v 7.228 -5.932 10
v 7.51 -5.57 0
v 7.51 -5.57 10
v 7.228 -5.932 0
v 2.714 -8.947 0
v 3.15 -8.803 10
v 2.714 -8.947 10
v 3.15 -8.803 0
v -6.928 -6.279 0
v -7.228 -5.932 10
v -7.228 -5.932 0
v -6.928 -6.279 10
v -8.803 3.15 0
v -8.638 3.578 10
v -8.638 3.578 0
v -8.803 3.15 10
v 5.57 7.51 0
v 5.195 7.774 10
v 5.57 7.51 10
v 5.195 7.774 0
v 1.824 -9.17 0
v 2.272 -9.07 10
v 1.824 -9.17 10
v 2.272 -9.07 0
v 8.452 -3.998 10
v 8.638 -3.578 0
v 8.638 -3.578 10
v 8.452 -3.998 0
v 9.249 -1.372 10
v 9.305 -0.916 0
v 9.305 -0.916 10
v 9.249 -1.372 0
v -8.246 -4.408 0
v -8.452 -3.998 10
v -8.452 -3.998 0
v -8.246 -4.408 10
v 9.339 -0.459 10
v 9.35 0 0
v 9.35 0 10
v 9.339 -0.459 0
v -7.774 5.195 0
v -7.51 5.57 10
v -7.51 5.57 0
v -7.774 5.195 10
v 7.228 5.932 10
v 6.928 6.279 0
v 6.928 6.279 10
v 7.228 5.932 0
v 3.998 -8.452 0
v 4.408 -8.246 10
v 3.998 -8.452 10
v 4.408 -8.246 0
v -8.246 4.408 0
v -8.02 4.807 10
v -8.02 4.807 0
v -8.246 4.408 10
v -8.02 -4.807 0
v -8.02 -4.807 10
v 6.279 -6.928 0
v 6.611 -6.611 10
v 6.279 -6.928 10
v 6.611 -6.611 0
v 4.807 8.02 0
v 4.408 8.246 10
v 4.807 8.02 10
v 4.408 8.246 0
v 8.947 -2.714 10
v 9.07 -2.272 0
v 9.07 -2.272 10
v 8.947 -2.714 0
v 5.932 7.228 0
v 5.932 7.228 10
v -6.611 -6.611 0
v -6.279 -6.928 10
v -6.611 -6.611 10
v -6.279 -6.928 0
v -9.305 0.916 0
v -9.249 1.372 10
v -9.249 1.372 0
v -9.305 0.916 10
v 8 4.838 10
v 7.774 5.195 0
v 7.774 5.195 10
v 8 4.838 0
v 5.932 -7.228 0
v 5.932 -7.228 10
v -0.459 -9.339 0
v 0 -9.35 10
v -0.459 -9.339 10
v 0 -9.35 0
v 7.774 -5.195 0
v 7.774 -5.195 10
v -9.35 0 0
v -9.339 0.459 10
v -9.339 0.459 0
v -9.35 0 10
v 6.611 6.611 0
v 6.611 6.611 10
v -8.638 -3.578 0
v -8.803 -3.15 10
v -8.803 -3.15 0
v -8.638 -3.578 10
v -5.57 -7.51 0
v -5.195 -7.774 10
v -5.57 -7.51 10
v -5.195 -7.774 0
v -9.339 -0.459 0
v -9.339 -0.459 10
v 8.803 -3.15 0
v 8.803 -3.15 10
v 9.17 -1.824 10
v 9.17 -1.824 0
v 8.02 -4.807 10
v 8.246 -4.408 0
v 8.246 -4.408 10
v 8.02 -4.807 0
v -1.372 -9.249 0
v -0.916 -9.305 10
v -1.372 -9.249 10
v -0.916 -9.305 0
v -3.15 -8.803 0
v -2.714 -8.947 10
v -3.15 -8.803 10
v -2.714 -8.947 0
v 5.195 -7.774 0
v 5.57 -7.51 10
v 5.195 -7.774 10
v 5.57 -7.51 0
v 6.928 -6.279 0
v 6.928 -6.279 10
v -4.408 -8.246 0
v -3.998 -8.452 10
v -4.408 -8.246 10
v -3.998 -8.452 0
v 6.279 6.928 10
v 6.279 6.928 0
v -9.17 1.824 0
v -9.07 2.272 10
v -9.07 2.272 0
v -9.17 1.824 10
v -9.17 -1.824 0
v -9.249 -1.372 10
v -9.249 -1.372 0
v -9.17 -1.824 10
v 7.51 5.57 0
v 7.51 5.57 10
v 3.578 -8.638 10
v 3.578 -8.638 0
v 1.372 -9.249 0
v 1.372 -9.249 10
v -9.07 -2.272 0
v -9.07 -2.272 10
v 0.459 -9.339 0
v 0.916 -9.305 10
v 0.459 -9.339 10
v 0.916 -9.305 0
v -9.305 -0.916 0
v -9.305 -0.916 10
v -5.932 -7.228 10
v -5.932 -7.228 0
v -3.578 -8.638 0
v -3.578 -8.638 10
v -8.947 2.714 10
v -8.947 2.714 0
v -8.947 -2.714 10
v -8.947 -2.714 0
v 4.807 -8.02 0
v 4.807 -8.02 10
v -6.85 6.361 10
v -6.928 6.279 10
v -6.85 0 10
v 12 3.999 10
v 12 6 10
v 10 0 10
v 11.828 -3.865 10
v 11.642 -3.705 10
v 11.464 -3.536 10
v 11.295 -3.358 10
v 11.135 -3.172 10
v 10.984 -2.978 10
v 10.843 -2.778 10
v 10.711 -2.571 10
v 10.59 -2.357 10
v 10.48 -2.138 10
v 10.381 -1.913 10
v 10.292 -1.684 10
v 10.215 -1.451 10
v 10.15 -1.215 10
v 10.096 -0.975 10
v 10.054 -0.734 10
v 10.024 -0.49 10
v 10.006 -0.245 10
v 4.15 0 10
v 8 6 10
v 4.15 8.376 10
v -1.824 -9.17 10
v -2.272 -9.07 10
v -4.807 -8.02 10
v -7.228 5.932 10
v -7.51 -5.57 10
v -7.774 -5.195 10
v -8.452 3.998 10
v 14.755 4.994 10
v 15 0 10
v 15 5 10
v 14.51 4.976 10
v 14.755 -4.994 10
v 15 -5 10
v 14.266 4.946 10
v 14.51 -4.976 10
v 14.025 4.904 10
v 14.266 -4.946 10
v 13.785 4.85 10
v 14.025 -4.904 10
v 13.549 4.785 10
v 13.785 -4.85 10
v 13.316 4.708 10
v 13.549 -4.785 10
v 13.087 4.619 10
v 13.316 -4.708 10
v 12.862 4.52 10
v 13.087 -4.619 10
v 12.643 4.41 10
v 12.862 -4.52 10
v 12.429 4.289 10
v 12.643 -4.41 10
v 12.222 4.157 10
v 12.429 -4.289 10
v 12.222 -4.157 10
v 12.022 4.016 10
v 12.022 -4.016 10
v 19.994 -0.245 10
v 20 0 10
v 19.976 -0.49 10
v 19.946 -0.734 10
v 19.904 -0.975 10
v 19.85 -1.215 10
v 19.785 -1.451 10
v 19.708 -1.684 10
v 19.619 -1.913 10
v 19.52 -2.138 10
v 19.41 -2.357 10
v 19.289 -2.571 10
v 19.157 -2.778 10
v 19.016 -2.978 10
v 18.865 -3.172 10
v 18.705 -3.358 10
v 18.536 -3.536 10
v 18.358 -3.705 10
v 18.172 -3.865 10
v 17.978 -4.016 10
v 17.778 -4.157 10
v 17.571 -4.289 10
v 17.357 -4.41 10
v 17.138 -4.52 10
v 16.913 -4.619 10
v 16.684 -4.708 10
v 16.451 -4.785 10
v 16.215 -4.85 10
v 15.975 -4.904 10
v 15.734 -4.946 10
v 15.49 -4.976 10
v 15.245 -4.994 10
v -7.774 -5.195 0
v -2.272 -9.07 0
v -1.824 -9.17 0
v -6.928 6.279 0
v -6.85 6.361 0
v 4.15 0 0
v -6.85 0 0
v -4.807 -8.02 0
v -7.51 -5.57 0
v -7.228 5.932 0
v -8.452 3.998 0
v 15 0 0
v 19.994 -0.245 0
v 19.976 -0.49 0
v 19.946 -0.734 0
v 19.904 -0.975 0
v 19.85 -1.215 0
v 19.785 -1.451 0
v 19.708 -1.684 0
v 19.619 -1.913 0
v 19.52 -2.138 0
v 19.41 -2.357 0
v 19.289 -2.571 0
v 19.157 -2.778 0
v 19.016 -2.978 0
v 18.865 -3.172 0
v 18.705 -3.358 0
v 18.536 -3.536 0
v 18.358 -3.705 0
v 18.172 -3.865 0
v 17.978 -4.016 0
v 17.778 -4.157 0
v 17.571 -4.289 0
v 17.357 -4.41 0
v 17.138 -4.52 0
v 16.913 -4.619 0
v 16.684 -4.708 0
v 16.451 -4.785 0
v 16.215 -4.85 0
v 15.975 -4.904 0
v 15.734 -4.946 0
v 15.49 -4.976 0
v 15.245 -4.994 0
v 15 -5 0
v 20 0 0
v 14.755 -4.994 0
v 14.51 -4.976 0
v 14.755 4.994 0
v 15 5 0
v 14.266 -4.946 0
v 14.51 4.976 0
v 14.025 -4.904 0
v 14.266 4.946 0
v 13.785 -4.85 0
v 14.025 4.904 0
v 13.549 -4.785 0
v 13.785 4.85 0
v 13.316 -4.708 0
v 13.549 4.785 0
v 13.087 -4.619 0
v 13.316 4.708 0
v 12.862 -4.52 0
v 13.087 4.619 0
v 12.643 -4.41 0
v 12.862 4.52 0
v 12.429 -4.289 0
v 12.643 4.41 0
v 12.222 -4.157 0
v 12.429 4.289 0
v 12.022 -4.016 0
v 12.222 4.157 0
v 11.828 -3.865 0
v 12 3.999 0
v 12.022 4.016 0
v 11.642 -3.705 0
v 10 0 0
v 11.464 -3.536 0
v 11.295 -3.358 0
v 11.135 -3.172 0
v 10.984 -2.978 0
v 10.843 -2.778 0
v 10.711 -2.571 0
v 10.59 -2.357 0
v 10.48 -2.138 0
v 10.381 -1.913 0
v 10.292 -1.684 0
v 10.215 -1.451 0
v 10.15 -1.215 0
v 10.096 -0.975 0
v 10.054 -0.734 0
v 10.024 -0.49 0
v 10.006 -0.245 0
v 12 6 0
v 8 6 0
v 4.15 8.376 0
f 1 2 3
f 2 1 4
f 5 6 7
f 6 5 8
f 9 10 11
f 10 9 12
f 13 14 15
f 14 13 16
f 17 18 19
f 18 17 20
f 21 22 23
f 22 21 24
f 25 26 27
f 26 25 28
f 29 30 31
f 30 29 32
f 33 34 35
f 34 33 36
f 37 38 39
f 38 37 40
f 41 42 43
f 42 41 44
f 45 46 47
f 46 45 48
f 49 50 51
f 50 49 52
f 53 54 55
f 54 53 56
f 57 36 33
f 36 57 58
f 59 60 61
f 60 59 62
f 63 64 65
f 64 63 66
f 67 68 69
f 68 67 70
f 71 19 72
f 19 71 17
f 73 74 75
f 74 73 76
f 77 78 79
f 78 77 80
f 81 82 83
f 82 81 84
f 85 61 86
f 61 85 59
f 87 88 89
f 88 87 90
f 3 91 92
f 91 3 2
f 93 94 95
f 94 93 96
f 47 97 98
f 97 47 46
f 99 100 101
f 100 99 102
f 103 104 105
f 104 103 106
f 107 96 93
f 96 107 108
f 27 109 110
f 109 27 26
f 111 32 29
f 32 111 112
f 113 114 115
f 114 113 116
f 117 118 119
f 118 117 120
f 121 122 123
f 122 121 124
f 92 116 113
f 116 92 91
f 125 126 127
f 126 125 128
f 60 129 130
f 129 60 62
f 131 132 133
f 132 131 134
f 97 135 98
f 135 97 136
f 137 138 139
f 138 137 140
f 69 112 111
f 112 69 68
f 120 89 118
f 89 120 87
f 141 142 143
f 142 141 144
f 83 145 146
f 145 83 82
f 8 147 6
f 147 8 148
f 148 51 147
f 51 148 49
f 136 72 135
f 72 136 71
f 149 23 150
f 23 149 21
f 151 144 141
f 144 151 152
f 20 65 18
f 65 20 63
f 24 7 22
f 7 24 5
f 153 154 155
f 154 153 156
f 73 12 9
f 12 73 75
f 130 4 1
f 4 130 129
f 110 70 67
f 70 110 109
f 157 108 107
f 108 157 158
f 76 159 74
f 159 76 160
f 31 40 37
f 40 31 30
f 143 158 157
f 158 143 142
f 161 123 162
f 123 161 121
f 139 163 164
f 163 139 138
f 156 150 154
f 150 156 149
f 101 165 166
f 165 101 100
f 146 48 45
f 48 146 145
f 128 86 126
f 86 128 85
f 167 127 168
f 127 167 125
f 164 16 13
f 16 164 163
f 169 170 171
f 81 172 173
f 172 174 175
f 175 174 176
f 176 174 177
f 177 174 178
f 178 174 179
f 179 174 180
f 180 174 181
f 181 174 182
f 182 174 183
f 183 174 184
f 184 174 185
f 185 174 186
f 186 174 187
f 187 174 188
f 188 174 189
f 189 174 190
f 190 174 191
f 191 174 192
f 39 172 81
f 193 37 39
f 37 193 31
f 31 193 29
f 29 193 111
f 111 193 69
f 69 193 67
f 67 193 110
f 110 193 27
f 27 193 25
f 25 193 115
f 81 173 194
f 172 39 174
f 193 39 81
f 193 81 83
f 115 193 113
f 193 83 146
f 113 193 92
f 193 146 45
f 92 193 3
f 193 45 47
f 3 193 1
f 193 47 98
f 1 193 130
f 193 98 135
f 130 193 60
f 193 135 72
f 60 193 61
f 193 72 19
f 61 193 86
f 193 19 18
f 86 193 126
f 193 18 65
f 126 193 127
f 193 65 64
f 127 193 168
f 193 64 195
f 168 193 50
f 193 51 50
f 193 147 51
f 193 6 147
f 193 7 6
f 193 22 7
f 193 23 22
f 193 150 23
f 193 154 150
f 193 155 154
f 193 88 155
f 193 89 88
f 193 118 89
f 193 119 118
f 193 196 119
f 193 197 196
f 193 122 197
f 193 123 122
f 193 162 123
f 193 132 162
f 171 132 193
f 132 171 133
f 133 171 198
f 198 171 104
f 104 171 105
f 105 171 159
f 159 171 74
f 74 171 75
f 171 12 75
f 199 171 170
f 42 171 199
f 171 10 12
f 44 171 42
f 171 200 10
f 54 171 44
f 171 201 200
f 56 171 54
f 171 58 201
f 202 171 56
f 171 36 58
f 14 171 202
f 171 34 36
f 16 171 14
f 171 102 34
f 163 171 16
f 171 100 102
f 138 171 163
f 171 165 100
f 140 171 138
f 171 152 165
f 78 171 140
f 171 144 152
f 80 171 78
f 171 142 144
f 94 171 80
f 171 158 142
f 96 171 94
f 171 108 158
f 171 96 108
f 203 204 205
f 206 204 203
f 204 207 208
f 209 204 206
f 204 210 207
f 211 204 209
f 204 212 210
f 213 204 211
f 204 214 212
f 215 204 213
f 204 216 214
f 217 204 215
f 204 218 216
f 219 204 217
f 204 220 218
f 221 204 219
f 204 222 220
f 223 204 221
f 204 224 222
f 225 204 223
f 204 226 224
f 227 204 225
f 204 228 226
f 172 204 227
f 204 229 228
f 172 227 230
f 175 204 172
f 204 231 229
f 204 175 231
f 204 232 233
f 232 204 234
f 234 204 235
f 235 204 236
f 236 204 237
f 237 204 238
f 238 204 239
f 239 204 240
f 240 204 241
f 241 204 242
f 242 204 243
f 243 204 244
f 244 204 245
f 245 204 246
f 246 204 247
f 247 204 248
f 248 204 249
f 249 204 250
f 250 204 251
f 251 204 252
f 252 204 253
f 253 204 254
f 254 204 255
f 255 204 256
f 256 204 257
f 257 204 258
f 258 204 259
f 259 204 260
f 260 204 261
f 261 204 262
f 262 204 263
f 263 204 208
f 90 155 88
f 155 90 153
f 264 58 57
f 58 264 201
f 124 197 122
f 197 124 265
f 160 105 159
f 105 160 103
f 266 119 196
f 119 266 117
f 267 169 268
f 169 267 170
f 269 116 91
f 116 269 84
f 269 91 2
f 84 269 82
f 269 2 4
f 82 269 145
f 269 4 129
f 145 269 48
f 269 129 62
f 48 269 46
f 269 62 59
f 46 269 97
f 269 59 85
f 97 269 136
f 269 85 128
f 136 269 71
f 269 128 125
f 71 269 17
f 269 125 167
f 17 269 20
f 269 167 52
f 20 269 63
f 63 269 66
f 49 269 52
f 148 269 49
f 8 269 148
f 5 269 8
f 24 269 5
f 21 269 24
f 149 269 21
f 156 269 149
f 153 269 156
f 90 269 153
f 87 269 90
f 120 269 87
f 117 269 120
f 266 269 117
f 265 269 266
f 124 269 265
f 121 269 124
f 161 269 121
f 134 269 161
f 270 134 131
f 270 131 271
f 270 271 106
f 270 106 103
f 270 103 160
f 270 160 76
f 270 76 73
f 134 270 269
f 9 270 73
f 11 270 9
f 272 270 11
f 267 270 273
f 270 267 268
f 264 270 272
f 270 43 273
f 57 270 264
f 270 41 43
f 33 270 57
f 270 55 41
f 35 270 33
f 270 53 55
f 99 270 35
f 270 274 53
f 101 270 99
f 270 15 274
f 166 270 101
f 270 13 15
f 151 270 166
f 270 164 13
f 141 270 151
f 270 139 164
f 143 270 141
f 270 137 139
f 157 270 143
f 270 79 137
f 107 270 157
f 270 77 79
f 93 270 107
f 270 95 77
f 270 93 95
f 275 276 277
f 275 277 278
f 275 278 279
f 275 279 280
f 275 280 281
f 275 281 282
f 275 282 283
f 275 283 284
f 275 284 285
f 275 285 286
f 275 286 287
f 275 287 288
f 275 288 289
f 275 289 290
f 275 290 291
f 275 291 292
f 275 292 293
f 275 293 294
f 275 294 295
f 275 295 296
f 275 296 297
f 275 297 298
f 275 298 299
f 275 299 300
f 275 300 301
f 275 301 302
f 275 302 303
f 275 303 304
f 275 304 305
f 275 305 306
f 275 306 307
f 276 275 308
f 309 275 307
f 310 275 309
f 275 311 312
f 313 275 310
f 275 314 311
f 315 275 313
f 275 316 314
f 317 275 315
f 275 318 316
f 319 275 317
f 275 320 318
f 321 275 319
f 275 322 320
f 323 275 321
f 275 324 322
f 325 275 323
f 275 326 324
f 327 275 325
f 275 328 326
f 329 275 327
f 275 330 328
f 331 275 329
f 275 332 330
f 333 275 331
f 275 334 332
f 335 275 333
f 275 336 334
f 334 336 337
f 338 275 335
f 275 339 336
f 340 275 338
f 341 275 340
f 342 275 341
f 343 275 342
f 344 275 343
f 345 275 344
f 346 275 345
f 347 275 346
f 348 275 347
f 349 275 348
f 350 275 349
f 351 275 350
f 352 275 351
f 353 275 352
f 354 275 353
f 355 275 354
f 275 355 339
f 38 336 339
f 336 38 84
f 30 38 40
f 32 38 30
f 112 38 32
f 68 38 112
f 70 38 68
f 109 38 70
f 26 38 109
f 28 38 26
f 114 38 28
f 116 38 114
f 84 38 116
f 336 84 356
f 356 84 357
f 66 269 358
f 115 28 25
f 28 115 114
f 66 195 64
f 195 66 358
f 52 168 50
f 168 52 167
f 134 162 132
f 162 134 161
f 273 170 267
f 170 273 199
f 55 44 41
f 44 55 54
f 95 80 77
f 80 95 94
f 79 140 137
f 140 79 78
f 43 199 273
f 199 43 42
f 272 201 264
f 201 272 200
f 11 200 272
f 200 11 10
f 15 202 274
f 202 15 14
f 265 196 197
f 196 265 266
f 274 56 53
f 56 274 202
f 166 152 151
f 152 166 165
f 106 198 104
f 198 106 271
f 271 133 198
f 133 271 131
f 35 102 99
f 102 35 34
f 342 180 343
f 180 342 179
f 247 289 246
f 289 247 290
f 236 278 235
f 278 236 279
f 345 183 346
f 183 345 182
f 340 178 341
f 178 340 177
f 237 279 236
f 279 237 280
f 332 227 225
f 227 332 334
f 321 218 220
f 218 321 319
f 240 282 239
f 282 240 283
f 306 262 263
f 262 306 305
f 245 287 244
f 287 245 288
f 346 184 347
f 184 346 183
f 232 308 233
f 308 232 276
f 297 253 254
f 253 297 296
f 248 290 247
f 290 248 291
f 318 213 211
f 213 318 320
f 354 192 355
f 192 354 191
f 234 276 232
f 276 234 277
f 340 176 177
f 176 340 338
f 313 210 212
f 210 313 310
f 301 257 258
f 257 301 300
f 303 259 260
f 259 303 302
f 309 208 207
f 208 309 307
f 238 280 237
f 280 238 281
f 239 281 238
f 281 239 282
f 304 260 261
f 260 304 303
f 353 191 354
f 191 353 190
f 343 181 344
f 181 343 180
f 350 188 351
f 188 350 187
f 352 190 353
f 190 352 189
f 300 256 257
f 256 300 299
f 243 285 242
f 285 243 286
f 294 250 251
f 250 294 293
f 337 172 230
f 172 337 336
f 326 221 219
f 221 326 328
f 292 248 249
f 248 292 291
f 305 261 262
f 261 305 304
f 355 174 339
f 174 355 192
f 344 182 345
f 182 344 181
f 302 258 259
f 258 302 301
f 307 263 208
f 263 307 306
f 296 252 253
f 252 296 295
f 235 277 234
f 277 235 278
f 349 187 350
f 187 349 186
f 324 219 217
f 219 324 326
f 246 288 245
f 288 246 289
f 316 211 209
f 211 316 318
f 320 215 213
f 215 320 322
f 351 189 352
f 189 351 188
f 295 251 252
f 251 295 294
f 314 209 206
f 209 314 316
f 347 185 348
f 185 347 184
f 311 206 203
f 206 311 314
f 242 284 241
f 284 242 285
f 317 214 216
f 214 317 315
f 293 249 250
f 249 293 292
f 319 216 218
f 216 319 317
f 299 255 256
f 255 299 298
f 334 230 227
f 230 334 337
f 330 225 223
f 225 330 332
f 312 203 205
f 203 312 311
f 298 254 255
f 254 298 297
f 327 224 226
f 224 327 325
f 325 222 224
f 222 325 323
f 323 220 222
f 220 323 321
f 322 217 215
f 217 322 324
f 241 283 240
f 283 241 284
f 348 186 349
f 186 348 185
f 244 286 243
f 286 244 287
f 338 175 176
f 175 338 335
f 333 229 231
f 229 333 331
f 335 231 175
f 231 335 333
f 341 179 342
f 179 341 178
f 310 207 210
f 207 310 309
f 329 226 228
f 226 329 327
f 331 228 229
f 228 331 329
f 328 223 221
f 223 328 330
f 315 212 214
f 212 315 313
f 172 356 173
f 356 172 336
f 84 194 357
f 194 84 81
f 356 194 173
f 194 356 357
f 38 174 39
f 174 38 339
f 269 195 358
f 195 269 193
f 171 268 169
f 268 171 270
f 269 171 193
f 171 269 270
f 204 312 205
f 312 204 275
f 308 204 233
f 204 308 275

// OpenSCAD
$fn = 128; // High resolution for smooth curves and accurate hole sizes

// --- Dimensions ---
// Rod dimensions
$rod_diameter = 12.7;
$rod_radius = $rod_diameter / 2;
$rod_wall_thickness = 3;
$rod_outer_diameter = $rod_diameter + (2 * $rod_wall_thickness);
$rod_outer_radius = $rod_outer_diameter / 2;

// Tubing dimensions
$tubing_diameter = 6;
$tubing_radius = $tubing_diameter / 2;
$tubing_wall_thickness = 2;
$tubing_outer_diameter = $tubing_diameter + (2 * $tubing_wall_thickness);
$tubing_outer_radius = $tubing_outer_diameter / 2;

// Positioning
$bridge_start_x = 8;
$bridge_end_x = 12;
$bridge_width_y = 6;

// Cutout dimensions
$rod_cutout_width = 10;
$rod_cutout_half_y = 5;

$tubing_cutout_width = 4.5;
$tubing_cutout_half_y = 2.25;

// Extrusion height
$height = 10;

// --- Main Module ---
module snap_on_clip() {
    difference() {
        // 1. Create the solid base profile (Union of all parts)
        union() {
            // Rod Ring
            // Outer cylinder
            cylinder(h = $height, r = $rod_outer_radius, center = [0, 0, $height/2]);
            
            // Tubing Ring (Positioned at x=15, y=0)
            translate([15, 0, 0]) {
                cylinder(h = $height, r = $tubing_outer_radius, center = [0, 0, $height/2]);
            }
            
            // Solid Bridge (Positioned between x=8 and x=12)
            // Width is 6mm in Y, centered at y=0 -> y from -3 to 3
            translate([$bridge_start_x, 0, 0]) {
                cube([($bridge_end_x - $bridge_start_x), $bridge_width_y, $height], center = [0, 0, $height/2]);
            }
        }
        
        // 2. Cut out the Rod Opening (-X side)
        // Condition: x < 0 and -5 < y < 5
        // We extend slightly past the faces to ensure clean cut
        translate([-($rod_radius + 0.5), 0, 0]) {
            // Cut a box that covers the opening area
            // Width: 10mm (from x=-5 to x=0) + buffer
            // Height: 10mm (from y=-5 to y=5) + buffer
            // Depth: Full height + buffer
            cube([($rod_cutout_width + 1), ($rod_cutout_half_y * 2 + 1), $height + 1], 
                  center = [0, 0, $height/2]);
        }
        
        // 3. Cut out the Tubing Opening (+X side)
        // Condition: x > 15 and -2.25 < y < 2.25
        // Center of cutout is at x=15. We cut from x=15 to x=15+4.5
        translate([15, 0, 0]) {
            // Cut a box that covers the opening area
            // Width: 4.5mm (from x=15 to x=19.5) + buffer
            // Height: 4.5mm (from y=-2.25 to y=2.25) + buffer
            // Depth: Full height + buffer
            cube([$tubing_cutout_width + 1, ($tubing_cutout_half_y * 2) + 1, $height + 1], 
                  center = [0, 0, $height/2]);
        }
    }
}

// Generate the part
snap_on_clip();
